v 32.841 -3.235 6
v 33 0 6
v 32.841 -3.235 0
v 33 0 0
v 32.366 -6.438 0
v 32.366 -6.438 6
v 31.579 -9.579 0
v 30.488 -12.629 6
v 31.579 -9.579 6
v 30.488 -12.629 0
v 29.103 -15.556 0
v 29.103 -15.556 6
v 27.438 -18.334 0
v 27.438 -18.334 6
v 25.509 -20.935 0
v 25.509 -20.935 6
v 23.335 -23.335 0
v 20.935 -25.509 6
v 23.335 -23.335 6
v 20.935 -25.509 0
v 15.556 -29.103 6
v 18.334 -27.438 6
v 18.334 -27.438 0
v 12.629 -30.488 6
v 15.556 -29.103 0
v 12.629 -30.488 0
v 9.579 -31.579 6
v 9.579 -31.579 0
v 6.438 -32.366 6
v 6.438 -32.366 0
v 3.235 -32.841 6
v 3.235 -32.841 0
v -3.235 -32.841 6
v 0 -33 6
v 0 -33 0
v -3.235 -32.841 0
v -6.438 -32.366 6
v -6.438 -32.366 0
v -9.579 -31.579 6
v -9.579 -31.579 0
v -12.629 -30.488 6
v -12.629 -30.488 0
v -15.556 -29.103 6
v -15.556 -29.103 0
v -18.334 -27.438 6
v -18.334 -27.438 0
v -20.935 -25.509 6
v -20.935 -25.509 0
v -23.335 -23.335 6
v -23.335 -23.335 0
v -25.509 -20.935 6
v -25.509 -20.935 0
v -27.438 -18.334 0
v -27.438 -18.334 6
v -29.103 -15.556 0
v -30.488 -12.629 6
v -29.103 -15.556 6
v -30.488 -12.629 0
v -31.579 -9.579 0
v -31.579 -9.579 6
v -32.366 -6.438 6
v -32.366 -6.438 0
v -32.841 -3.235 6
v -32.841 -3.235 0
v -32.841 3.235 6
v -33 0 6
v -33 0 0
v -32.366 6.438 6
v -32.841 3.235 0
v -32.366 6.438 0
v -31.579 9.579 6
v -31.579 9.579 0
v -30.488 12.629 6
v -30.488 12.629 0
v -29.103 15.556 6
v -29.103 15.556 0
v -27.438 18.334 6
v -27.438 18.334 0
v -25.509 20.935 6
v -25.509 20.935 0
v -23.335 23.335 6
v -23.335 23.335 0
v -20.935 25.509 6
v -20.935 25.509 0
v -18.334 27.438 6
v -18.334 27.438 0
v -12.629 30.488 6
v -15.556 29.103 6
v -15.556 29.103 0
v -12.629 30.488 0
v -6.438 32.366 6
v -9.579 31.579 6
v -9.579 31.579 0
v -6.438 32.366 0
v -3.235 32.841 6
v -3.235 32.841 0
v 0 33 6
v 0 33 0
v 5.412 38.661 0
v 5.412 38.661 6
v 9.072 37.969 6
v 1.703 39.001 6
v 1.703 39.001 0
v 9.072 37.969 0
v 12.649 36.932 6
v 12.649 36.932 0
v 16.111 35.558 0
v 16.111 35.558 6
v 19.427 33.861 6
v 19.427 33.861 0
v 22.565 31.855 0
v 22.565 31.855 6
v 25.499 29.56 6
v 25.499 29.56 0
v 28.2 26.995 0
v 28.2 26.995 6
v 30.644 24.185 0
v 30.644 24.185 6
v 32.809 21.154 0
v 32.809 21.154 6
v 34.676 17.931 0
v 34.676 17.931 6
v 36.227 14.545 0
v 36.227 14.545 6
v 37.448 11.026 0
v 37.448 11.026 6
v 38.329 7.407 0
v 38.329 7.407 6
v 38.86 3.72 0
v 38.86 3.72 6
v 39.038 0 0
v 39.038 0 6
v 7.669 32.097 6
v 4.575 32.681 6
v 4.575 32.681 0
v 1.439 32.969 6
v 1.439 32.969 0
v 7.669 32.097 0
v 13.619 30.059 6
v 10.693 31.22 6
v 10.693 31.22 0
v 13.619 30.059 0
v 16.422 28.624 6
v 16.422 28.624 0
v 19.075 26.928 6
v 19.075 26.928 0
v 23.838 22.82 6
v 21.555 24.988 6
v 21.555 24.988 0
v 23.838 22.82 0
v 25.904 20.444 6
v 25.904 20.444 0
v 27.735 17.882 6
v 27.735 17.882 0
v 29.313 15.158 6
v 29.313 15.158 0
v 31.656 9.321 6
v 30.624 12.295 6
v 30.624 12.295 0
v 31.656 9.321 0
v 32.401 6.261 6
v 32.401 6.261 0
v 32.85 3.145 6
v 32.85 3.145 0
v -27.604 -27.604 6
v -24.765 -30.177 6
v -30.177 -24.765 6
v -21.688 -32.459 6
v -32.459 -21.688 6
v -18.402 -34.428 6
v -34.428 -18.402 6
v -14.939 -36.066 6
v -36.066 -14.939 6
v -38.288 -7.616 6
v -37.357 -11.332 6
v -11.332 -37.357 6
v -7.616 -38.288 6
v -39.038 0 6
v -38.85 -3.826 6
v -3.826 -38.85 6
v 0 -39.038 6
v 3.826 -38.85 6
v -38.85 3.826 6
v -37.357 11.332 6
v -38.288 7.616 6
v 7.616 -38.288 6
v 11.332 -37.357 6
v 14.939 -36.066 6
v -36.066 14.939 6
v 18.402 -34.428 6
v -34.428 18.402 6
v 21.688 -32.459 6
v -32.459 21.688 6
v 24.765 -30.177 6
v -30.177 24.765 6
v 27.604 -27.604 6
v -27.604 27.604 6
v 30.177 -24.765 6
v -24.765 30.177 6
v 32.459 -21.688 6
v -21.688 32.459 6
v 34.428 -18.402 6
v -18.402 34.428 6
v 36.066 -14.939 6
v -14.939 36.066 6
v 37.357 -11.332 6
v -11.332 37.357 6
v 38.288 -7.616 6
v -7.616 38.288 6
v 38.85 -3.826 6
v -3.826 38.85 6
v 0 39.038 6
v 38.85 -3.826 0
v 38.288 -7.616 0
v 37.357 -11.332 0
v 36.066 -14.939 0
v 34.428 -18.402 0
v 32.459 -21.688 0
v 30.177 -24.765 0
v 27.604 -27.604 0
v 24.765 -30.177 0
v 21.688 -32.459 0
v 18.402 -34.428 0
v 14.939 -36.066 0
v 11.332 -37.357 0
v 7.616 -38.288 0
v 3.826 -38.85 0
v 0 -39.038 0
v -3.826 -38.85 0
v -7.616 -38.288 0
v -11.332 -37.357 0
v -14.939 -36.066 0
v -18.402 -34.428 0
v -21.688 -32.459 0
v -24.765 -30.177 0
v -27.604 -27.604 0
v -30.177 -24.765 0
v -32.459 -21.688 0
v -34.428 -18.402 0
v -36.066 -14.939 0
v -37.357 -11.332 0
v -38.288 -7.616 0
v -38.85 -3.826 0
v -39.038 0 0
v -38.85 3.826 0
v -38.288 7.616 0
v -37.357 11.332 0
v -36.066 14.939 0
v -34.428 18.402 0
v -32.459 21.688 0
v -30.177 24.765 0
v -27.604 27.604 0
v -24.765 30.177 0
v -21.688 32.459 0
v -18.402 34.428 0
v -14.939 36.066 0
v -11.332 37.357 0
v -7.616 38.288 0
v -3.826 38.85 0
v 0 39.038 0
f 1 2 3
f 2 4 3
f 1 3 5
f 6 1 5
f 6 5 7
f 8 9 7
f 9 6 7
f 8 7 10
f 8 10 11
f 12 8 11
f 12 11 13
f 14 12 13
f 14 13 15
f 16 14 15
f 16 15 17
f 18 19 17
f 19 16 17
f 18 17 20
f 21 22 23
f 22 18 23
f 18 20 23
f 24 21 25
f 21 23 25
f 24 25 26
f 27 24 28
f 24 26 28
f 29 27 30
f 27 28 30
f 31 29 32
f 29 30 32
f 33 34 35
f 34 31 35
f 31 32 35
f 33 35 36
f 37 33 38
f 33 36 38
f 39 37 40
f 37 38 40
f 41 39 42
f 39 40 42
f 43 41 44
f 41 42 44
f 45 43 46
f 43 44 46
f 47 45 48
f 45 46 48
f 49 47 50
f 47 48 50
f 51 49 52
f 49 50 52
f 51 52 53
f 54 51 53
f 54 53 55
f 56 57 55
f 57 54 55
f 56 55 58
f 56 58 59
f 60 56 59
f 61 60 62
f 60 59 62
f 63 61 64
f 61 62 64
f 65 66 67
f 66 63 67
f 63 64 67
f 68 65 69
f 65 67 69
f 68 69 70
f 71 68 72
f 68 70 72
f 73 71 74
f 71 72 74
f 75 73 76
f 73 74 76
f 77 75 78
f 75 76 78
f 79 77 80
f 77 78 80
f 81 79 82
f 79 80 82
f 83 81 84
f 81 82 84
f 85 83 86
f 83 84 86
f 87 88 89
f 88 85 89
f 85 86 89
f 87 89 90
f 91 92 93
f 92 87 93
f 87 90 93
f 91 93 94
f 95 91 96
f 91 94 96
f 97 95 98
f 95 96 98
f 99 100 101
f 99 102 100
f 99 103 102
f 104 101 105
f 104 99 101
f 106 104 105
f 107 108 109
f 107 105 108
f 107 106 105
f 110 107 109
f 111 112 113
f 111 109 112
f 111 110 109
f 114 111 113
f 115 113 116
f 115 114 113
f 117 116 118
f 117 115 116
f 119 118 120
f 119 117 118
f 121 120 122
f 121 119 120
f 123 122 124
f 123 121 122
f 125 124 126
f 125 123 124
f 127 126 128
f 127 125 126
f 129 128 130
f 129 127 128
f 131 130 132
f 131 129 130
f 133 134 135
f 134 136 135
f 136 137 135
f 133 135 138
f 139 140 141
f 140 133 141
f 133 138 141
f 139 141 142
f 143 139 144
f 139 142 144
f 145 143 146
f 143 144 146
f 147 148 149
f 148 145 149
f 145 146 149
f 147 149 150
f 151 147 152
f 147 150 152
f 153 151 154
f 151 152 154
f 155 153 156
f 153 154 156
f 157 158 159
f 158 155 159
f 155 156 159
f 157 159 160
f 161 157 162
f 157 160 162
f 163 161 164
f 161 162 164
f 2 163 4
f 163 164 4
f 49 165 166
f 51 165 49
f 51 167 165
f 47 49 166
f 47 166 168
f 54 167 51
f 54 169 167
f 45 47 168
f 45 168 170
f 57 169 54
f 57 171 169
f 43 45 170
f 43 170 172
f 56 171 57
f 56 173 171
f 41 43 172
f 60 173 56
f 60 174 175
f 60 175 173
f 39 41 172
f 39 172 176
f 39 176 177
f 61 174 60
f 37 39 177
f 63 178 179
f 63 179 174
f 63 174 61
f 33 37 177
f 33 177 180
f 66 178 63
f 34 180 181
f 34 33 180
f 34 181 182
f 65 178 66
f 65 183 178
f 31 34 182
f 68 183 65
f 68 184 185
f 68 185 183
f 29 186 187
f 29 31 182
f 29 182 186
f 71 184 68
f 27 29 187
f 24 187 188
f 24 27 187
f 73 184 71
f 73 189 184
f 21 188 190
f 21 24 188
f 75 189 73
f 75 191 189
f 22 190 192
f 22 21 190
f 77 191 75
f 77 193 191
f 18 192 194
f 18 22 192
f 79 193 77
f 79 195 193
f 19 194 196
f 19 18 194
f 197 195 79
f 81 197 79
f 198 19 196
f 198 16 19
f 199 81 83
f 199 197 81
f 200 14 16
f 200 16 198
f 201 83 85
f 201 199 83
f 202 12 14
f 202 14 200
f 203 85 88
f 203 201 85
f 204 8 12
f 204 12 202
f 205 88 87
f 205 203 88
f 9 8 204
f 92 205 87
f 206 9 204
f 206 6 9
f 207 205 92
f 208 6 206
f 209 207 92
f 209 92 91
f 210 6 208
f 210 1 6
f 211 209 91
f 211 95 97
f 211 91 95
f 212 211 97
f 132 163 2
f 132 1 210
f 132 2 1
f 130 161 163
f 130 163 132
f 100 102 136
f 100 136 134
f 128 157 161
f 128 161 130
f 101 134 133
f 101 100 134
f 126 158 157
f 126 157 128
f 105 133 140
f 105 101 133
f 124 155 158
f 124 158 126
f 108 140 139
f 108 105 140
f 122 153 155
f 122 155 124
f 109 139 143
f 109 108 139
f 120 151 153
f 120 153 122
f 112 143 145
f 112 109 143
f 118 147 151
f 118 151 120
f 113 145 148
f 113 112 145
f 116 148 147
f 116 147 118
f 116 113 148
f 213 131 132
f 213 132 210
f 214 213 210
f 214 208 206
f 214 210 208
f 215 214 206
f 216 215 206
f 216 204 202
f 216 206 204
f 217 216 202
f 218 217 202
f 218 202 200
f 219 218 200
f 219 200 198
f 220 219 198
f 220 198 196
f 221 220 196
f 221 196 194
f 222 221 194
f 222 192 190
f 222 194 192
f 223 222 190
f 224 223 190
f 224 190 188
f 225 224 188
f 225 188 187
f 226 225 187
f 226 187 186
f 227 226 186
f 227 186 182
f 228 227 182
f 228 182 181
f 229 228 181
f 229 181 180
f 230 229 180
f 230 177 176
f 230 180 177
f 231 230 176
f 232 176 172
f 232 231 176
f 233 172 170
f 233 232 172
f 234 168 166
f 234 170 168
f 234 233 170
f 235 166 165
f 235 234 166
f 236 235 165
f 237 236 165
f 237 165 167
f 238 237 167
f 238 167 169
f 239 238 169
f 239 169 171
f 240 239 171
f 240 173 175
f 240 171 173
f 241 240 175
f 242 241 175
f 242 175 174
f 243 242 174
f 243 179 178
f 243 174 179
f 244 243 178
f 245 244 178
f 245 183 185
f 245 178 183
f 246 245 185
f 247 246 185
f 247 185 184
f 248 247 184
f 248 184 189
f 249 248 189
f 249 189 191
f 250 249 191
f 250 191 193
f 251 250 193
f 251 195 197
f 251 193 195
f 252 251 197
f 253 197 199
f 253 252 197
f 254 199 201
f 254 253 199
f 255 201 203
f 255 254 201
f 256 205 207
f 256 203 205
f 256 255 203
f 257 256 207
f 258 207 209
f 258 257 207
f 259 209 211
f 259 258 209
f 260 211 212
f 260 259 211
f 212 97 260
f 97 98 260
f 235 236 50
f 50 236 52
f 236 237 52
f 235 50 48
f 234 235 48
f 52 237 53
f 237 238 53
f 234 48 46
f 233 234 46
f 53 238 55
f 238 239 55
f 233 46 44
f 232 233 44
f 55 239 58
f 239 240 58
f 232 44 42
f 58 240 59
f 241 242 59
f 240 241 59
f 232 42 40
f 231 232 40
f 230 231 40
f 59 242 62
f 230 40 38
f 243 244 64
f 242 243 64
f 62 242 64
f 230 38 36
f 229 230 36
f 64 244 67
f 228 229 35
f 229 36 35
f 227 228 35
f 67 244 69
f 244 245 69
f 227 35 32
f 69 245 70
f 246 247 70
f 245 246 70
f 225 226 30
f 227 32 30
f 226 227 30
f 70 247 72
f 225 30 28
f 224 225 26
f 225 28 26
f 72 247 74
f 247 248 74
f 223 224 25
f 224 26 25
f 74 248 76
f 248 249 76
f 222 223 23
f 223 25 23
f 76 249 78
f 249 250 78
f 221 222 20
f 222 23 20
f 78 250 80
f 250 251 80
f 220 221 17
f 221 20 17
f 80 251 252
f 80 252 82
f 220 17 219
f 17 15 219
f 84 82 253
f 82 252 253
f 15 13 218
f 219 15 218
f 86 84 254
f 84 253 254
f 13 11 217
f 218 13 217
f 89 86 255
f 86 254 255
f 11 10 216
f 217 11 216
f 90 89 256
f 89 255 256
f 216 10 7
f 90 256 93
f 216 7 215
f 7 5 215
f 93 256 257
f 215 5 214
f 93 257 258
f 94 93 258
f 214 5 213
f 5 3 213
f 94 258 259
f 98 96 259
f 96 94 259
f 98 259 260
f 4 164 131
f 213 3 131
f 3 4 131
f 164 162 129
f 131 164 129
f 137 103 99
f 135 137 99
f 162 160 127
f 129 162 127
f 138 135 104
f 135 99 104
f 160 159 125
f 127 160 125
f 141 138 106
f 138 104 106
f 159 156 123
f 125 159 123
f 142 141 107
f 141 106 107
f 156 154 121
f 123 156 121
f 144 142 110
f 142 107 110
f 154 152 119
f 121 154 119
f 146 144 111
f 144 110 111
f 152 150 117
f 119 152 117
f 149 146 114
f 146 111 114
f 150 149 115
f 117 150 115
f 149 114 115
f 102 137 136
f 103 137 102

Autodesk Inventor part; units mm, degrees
ref_plane "YZ Plane" through (0, 0, 0) normal (1, 0, 0) x (0, 1, 0)
ref_plane "XZ Plane" through (0, 0, 0) normal (0, 1, 0) x (-1, 0, 0)
ref_plane "XY Plane" through (0, 0, 0) normal (0, 0, 1) x (1, 0, 0)
sketch "Sketch13" plane through (0, 0, 0) normal (0, 0, 1) x (1, 0, 0)
  circle A0 centre (0, 0) radius 33
  circle A1 centre (0, 0) radius 39.038
  line L0 (0, 0) -> (0, 39.038)
  line L1 (0, 0) -> (1.7028, 39.0008)
  line L2 (0, 0) -> (39.038, 0) construction
  point P0 (1.4394, 32.9686)
  point P1 (0, 33)
  dimension "d62" = 66
  dimension "d63" = 78.076
  dimension "d64" = 87.5
extrude "Extrusion12" add sketch "Sketch13" along normal blind 6 contours A0 L1 A1 L0 picked at (-2.8956, 36.6991)
sketch "Sketch4" plane through (40, -2.75, -25.3875) normal (1, 0, 0) x (0, 0, -1)
  line L0 (-51.025, 0.25) -> (-51.6313, 0.25) projected
  line L1 (-51.025, 0.25) -> (-55.267, 0.25)
  line L2 (-55.267, 0.25) -> (-55.267, 5.25)
  line L3 (-55.267, 5.25) -> (-51.025, 5.25)
  line L4 (-51.025, 5.25) -> (-51.025, 0.25)
  point P0 (-25.3875, 2.75)
  point P1 (-51.6313, 0.25)
  dimension "d33" = 4.242
  dimension "d34" = 5
sketch "Sketch5" plane through (40, -2.75, -25.3875) normal (1, 0, 0) x (0, 0, -1)
  line L0 (-51.6563, 0.25) -> (-55.267, 0.25) projected
  line L1 (-55.267, 5.25) -> (-51.6563, 5.25) projected
  line L2 (-55.267, 0.25) -> (-52.267, 0.25)
  line L3 (-52.267, 0.25) -> (-52.267, 5.25)
  line L4 (-52.267, 5.25) -> (-55.267, 5.25)
  line L5 (-55.267, 5.25) -> (-55.267, 0.25)
  point P0 (-25.3875, 2.75)
  point P1 (-55.267, 5.25)
  point P2 (-52.267, 0.25)
  dimension "d37" = 3
sketch "Sketch6" plane through (220, -2.75, -25.3875) normal (1, 0, 0) x (0, 0, -1)
  line L0 (-51.6563, 0.25) -> (-55.267, 0.25) projected
  line L1 (-55.267, 0.25) -> (-51.025, 0.25)
  line L2 (-51.025, 0.25) -> (-51.025, 5.25)
  line L3 (-51.025, 5.25) -> (-55.267, 5.25)
  line L4 (-55.267, 5.25) -> (-55.267, 0.25)
  point P0 (-25.3875, 2.75)
  dimension "d40" = 4.242
sketch "Sketch7" plane through (30, -2.75, -25.3875) normal (-1, 0, 0) x (0, 0, 1)
  line L0 (55.267, 0.25) -> (55.267, 5.25) projected
  line L1 (55.267, 0.25) -> (58.267, 0.25)
  line L2 (58.267, 0.25) -> (58.267, 5.25)
  line L3 (58.267, 5.25) -> (55.267, 5.25)
  line L4 (55.267, 5.25) -> (55.267, 0.25)
  point P0 (25.3875, 2.75)
  dimension "d43" = 3
  dimension "d44" = 5
sketch "Sketch8" plane through (30, -2.75, -25.3875) normal (-1, 0, 0) x (0, 0, 1)
  line L0 (51.6563, 0.25) -> (58.267, 0.25) projected
  line L1 (58.267, 5.25) -> (51.6563, 5.25) projected
  line L2 (58.267, 0.25) -> (57.025, 0.25)
  line L3 (57.025, 0.25) -> (57.025, 5.25)
  line L4 (57.025, 5.25) -> (58.267, 5.25)
  line L5 (58.267, 5.25) -> (58.267, 0.25)
  point P0 (25.3875, 2.75)
  point P1 (57.025, 0.25)
  dimension "d47" = 1.242
sketch "Sketch9" plane through (40, -2.75, -25.3875) normal (1, 0, 0) x (0, 0, -1)
  line L0 (-52.267, 0.25) -> (-51.025, 0.25) projected
  line L1 (-51.025, 5.25) -> (-51.025, 0.25) projected
  line L2 (-52.267, 0.25) -> (-51.025, 0.25)
  line L3 (-51.025, 0.25) -> (-51.025, 5.25)
  line L4 (-51.025, 5.25) -> (-52.267, 5.25)
  line L5 (-52.267, 5.25) -> (-52.267, 0.25)
  point P0 (-25.3875, 2.75)
properties part number "4002_Bias_Coil_Holder_Tube_Mount_Layer2_MPSv2_v1" material "Acetal Resin, White"
